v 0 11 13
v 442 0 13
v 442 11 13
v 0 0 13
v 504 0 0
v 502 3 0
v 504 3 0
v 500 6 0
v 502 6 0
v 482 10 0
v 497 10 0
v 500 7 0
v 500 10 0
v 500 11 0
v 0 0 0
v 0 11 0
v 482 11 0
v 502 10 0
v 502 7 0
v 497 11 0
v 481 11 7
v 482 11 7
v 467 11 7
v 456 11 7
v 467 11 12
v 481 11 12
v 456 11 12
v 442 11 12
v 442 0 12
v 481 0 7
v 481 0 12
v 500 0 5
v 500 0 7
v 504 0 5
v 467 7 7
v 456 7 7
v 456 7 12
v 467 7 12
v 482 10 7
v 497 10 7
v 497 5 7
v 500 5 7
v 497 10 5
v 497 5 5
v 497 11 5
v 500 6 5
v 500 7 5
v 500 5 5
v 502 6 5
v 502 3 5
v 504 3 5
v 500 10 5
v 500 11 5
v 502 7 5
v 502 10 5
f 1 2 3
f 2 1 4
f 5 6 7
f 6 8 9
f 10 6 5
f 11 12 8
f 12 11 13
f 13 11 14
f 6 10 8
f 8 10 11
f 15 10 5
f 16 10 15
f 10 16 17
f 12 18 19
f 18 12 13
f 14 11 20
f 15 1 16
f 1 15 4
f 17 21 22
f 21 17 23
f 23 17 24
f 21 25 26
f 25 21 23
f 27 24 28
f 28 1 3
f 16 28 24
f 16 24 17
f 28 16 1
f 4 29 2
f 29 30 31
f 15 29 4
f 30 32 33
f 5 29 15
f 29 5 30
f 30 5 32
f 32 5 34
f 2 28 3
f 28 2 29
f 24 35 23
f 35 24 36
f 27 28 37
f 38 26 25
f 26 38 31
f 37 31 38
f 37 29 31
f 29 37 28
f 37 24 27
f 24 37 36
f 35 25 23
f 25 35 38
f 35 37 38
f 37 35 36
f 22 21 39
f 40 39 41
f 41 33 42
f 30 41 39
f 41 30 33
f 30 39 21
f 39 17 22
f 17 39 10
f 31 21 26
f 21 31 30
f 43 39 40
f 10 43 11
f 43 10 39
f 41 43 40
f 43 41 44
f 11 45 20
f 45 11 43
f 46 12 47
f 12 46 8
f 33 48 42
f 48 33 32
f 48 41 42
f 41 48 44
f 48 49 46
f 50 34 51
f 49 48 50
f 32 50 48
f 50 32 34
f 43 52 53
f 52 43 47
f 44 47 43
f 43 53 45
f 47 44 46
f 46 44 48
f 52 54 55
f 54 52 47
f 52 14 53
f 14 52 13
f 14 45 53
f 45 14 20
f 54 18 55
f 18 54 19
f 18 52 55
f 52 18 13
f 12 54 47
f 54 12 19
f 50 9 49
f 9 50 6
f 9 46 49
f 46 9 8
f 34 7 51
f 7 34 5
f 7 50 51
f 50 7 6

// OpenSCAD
translate([8.5, 5.5, 6.5]) color([0.38668300553323576, 0.04703291581184044, 0.4708892090480652]) cube([17, 11, 13], center=true);
translate([25.5, 5.5, 6.5]) color([0.15136775389483625, 0.03246546237394399, 0.6174004236810055]) cube([17, 11, 13], center=true);
translate([42.5, 5.5, 6.5]) color([0.6299662912183356, 0.10529282465636491, 0.5491437662317772]) cube([17, 11, 13], center=true);
translate([59.5, 5.5, 6.5]) color([0.3466679766399683, 0.3834140731648874, 0.7764198986996783]) cube([17, 11, 13], center=true);
translate([76.5, 5.5, 6.5]) color([0.49031967752424566, 0.8812766154122413, 0.6101197429062234]) cube([17, 11, 13], center=true);
translate([93.5, 5.5, 6.5]) color([0.4671884150380703, 0.6323126400553846, 0.3378653798287524]) cube([17, 11, 13], center=true);
translate([110.5, 5.5, 6.5]) color([0.12432379252825243, 0.6825296186925238, 0.622037442746657]) cube([17, 11, 13], center=true);
translate([127.5, 5.5, 6.5]) color([0.7885664913738635, 0.1271091249471088, 0.9117833181295222]) cube([17, 11, 13], center=true);
translate([144.5, 5.5, 6.5]) color([0.799341211421814, 0.9168874080910093, 0.8725347217734669]) cube([17, 11, 13], center=true);
translate([161.5, 5.5, 6.5]) color([0.681006446357057, 0.8102508494373589, 0.5190073092314018]) cube([17, 11, 13], center=true);
translate([178.5, 5.5, 6.5]) color([0.7854891493606652, 0.18912746785718504, 0.7821141063572942]) cube([17, 11, 13], center=true);
translate([195.5, 5.5, 6.5]) color([0.44457960405634067, 0.756616221297365, 0.4554702368121878]) cube([17, 11, 13], center=true);
translate([212.5, 5.5, 6.5]) color([0.7895587282777832, 0.07533958521856021, 0.04464090542441246]) cube([17, 11, 13], center=true);
translate([229.5, 5.5, 6.5]) color([0.9342895823715677, 0.4861651007487351, 0.9010713996489047]) cube([17, 11, 13], center=true);
translate([246.5, 5.5, 6.5]) color([0.9447832518820701, 0.6665111524556335, 0.5717968260934746]) cube([17, 11, 13], center=true);
translate([263.5, 5.5, 6.5]) color([0.21597938410680917, 0.09347621929900818, 0.8193942150822732]) cube([17, 11, 13], center=true);
translate([280.5, 5.5, 6.5]) color([0.8887720676319878, 0.7793957106948857, 0.6985024327316249]) cube([17, 11, 13], center=true);
translate([297.5, 5.5, 6.5]) color([0.42011111607482077, 0.3053115900269564, 0.11344489563770899]) cube([17, 11, 13], center=true);
translate([314.5, 5.5, 6.5]) color([0.425970248072163, 0.5660129742477574, 0.9228805831375125]) cube([17, 11, 13], center=true);
translate([326.5, 5.5, 6.5]) color([0.9357547693309531, 0.41564119654091314, 0.0992109880980957]) cube([7, 11, 13], center=true);
translate([333.5, 5.5, 6.5]) color([0.7738187324714434, 0.7342793416571158, 0.03070084595190614]) cube([7, 11, 13], center=true);
translate([340.5, 5.5, 6.5]) color([0.4467185991338365, 0.6864181042985581, 0.030134234552269934]) cube([7, 11, 13], center=true);
translate([347.5, 5.5, 6.5]) color([0.9192823534016137, 0.9622424865104192, 0.72254277208884]) cube([7, 11, 13], center=true);
translate([354.5, 5.5, 6.5]) color([0.0785385396518038, 0.07032946587635569, 0.3592533148212369]) cube([7, 11, 13], center=true);
translate([361.5, 5.5, 6.5]) color([0.029377507756986443, 0.3478777272843395, 0.009964241312966027]) cube([7, 11, 13], center=true);
translate([368.5, 5.5, 6.5]) color([0.9743235128409679, 0.8190066990688627, 0.07051761147818736]) cube([7, 11, 13], center=true);
translate([375.5, 5.5, 6.5]) color([0.8934350918478603, 0.20797804000401565, 0.20479079826934998]) cube([7, 11, 13], center=true);
translate([382.5, 5.5, 6.5]) color([0.6737591455288341, 0.9382622681625481, 0.12318812122923739]) cube([7, 11, 13], center=true);
translate([389.5, 5.5, 6.5]) color([0.007184567252270457, 0.3691301471700257, 0.024650014436155776]) cube([7, 11, 13], center=true);
translate([396.5, 5.5, 6.5]) color([0.6048482375805311, 0.8591756086192088, 0.1869917024228578]) cube([7, 11, 13], center=true);
translate([403.5, 5.5, 6.5]) color([0.11239103583018406, 0.34444960733861085, 0.9591715206073138]) cube([7, 11, 13], center=true);
translate([410.5, 5.5, 6.5]) color([0.13015769442868408, 0.9665192604669938, 0.36223986994484925]) cube([7, 11, 13], center=true);
translate([417.5, 5.5, 6.5]) color([0.47337040276011155, 0.29263198596497353, 0.9371268442154698]) cube([7, 11, 13], center=true);
translate([424.5, 5.5, 6.5]) color([0.9581478949874975, 0.6359157065077434, 0.18404555017515556]) cube([7, 11, 13], center=true);
translate([431.5, 5.5, 6.5]) color([0.9929517886102871, 0.10258043954691198, 0.5808493815940804]) cube([7, 11, 13], center=true);
translate([438.5, 5.5, 6.5]) color([0.15640306008300875, 0.8976753141502056, 0.9456783914956152]) cube([7, 11, 13], center=true);
translate([444.5, 5.5, 3.5]) color([0.8043902980001079, 0.3158914186681244, 0.2428386899579852]) cube([5, 11, 7], center=true);
translate([449.5, 5.5, 3.5]) color([0.7548584132190378, 0.291059519145354, 0.4197853778540753]) cube([5, 11, 7], center=true);
translate([445.5, 5.5, 9.5]) color([0.04625567690264132, 0.13223381043380655, 0.020549620641776678]) cube([7, 11, 5], center=true);
translate([454.5, 5.5, 3.5]) color([0.0779211200935358, 0.07321114936486084, 0.42023170217414685]) cube([5, 11, 7], center=true);
translate([452.5, 5.5, 9.5]) color([0.5507771776374378, 0.740878819870922, 0.14228347384241602]) cube([7, 11, 5], center=true);
translate([459.5, 5.5, 3.5]) color([0.4221887461694188, 0.6369660374117204, 0.08455569481893255]) cube([5, 11, 7], center=true);
translate([464.5, 5.5, 3.5]) color([0.44481115514620384, 0.3692560392397978, 0.9489319289416618]) cube([5, 11, 7], center=true);
translate([461.5, 3.5, 9.5]) color([0.05785711390101722, 0.40862622118314806, 0.41722547979620506]) cube([11, 7, 5], center=true);
translate([469.5, 5.5, 3.5]) color([0.728180504599678, 0.3206710028745039, 0.20399027594623398]) cube([5, 11, 7], center=true);
translate([474.5, 5.5, 3.5]) color([0.2933116551663051, 0.4708875424493587, 0.9502683295716211]) cube([5, 11, 7], center=true);
translate([470.5, 5.5, 9.5]) color([0.7965170227633064, 0.2769702457797433, 0.5581815883930463]) cube([7, 11, 5], center=true);
translate([479.5, 5.5, 3.5]) color([0.6882003035685332, 0.7956571556821322, 0.4461643839498476]) cube([5, 11, 7], center=true);
translate([477.5, 5.5, 9.5]) color([0.398776905129706, 0.7676407428212785, 0.43171649556411207]) cube([7, 11, 5], center=true);
translate([483.5, 2.5, 3.5]) color([0.2479576688970051, 0.4534470315306477, 0.9371046462904561]) cube([3, 5, 7], center=true);
translate([483.5, 7.5, 3.5]) color([0.14256748821860132, 0.4624353545272121, 0.6373035243637815]) cube([3, 5, 7], center=true);
translate([486.5, 7.5, 3.5]) color([0.48328798826810027, 0.20363990437036994, 0.0018431606156659175]) cube([3, 5, 7], center=true);
translate([486.5, 2.5, 3.5]) color([0.698991711803439, 0.6187355180234525, 0.007776649435864202]) cube([3, 5, 7], center=true);
translate([489.5, 2.5, 3.5]) color([0.2985601210181208, 0.7686342595428415, 0.6289203785446209]) cube([3, 5, 7], center=true);
translate([489.5, 7.5, 3.5]) color([0.5452081159439722, 0.1562211098090489, 0.7062940429996885]) cube([3, 5, 7], center=true);
translate([492.5, 7.5, 3.5]) color([0.4714349217158037, 0.6781787462359636, 0.7600898367234922]) cube([3, 5, 7], center=true);
translate([492.5, 2.5, 3.5]) color([0.23236272144124515, 0.7619950130977117, 0.28008838468838926]) cube([3, 5, 7], center=true);
translate([495.5, 2.5, 3.5]) color([0.9840151371182455, 0.12083161078451865, 0.8837180187440564]) cube([3, 5, 7], center=true);
translate([495.5, 7.5, 3.5]) color([0.040547125043371324, 0.256575818348144, 0.5261019087624684]) cube([3, 5, 7], center=true);
translate([498.5, 2.5, 3.5]) color([0.5816161834445946, 0.3962349850280922, 0.10203172822707107]) cube([3, 5, 7], center=true);
translate([498.5, 6.0, 2.5]) color([0.2526080858247133, 0.28339650386048865, 0.7552228545587315]) cube([3, 2, 5], center=true);
translate([498.5, 8.0, 2.5]) color([0.9087743252220071, 0.5954099154864194, 0.03545096569102746]) cube([3, 2, 5], center=true);
translate([498.5, 10.0, 2.5]) color([0.7922364716417103, 0.30560393283991993, 0.33989040641624346]) cube([3, 2, 5], center=true);
translate([501.0, 8.5, 2.5]) color([0.5301854376454147, 0.24904704757555507, 0.9199780878573697]) cube([2, 3, 5], center=true);
translate([501.0, 1.5, 2.5]) color([0.1635547583408129, 0.41483040050373277, 0.2896919495072058]) cube([2, 3, 5], center=true);
translate([501.0, 4.5, 2.5]) color([0.5198341022016146, 0.5739818030823766, 0.6271396891048426]) cube([2, 3, 5], center=true);
translate([503.0, 1.5, 2.5]) color([0.5313758038379728, 0.4108045023355995, 0.634594012376466]) cube([2, 3, 5], center=true);
